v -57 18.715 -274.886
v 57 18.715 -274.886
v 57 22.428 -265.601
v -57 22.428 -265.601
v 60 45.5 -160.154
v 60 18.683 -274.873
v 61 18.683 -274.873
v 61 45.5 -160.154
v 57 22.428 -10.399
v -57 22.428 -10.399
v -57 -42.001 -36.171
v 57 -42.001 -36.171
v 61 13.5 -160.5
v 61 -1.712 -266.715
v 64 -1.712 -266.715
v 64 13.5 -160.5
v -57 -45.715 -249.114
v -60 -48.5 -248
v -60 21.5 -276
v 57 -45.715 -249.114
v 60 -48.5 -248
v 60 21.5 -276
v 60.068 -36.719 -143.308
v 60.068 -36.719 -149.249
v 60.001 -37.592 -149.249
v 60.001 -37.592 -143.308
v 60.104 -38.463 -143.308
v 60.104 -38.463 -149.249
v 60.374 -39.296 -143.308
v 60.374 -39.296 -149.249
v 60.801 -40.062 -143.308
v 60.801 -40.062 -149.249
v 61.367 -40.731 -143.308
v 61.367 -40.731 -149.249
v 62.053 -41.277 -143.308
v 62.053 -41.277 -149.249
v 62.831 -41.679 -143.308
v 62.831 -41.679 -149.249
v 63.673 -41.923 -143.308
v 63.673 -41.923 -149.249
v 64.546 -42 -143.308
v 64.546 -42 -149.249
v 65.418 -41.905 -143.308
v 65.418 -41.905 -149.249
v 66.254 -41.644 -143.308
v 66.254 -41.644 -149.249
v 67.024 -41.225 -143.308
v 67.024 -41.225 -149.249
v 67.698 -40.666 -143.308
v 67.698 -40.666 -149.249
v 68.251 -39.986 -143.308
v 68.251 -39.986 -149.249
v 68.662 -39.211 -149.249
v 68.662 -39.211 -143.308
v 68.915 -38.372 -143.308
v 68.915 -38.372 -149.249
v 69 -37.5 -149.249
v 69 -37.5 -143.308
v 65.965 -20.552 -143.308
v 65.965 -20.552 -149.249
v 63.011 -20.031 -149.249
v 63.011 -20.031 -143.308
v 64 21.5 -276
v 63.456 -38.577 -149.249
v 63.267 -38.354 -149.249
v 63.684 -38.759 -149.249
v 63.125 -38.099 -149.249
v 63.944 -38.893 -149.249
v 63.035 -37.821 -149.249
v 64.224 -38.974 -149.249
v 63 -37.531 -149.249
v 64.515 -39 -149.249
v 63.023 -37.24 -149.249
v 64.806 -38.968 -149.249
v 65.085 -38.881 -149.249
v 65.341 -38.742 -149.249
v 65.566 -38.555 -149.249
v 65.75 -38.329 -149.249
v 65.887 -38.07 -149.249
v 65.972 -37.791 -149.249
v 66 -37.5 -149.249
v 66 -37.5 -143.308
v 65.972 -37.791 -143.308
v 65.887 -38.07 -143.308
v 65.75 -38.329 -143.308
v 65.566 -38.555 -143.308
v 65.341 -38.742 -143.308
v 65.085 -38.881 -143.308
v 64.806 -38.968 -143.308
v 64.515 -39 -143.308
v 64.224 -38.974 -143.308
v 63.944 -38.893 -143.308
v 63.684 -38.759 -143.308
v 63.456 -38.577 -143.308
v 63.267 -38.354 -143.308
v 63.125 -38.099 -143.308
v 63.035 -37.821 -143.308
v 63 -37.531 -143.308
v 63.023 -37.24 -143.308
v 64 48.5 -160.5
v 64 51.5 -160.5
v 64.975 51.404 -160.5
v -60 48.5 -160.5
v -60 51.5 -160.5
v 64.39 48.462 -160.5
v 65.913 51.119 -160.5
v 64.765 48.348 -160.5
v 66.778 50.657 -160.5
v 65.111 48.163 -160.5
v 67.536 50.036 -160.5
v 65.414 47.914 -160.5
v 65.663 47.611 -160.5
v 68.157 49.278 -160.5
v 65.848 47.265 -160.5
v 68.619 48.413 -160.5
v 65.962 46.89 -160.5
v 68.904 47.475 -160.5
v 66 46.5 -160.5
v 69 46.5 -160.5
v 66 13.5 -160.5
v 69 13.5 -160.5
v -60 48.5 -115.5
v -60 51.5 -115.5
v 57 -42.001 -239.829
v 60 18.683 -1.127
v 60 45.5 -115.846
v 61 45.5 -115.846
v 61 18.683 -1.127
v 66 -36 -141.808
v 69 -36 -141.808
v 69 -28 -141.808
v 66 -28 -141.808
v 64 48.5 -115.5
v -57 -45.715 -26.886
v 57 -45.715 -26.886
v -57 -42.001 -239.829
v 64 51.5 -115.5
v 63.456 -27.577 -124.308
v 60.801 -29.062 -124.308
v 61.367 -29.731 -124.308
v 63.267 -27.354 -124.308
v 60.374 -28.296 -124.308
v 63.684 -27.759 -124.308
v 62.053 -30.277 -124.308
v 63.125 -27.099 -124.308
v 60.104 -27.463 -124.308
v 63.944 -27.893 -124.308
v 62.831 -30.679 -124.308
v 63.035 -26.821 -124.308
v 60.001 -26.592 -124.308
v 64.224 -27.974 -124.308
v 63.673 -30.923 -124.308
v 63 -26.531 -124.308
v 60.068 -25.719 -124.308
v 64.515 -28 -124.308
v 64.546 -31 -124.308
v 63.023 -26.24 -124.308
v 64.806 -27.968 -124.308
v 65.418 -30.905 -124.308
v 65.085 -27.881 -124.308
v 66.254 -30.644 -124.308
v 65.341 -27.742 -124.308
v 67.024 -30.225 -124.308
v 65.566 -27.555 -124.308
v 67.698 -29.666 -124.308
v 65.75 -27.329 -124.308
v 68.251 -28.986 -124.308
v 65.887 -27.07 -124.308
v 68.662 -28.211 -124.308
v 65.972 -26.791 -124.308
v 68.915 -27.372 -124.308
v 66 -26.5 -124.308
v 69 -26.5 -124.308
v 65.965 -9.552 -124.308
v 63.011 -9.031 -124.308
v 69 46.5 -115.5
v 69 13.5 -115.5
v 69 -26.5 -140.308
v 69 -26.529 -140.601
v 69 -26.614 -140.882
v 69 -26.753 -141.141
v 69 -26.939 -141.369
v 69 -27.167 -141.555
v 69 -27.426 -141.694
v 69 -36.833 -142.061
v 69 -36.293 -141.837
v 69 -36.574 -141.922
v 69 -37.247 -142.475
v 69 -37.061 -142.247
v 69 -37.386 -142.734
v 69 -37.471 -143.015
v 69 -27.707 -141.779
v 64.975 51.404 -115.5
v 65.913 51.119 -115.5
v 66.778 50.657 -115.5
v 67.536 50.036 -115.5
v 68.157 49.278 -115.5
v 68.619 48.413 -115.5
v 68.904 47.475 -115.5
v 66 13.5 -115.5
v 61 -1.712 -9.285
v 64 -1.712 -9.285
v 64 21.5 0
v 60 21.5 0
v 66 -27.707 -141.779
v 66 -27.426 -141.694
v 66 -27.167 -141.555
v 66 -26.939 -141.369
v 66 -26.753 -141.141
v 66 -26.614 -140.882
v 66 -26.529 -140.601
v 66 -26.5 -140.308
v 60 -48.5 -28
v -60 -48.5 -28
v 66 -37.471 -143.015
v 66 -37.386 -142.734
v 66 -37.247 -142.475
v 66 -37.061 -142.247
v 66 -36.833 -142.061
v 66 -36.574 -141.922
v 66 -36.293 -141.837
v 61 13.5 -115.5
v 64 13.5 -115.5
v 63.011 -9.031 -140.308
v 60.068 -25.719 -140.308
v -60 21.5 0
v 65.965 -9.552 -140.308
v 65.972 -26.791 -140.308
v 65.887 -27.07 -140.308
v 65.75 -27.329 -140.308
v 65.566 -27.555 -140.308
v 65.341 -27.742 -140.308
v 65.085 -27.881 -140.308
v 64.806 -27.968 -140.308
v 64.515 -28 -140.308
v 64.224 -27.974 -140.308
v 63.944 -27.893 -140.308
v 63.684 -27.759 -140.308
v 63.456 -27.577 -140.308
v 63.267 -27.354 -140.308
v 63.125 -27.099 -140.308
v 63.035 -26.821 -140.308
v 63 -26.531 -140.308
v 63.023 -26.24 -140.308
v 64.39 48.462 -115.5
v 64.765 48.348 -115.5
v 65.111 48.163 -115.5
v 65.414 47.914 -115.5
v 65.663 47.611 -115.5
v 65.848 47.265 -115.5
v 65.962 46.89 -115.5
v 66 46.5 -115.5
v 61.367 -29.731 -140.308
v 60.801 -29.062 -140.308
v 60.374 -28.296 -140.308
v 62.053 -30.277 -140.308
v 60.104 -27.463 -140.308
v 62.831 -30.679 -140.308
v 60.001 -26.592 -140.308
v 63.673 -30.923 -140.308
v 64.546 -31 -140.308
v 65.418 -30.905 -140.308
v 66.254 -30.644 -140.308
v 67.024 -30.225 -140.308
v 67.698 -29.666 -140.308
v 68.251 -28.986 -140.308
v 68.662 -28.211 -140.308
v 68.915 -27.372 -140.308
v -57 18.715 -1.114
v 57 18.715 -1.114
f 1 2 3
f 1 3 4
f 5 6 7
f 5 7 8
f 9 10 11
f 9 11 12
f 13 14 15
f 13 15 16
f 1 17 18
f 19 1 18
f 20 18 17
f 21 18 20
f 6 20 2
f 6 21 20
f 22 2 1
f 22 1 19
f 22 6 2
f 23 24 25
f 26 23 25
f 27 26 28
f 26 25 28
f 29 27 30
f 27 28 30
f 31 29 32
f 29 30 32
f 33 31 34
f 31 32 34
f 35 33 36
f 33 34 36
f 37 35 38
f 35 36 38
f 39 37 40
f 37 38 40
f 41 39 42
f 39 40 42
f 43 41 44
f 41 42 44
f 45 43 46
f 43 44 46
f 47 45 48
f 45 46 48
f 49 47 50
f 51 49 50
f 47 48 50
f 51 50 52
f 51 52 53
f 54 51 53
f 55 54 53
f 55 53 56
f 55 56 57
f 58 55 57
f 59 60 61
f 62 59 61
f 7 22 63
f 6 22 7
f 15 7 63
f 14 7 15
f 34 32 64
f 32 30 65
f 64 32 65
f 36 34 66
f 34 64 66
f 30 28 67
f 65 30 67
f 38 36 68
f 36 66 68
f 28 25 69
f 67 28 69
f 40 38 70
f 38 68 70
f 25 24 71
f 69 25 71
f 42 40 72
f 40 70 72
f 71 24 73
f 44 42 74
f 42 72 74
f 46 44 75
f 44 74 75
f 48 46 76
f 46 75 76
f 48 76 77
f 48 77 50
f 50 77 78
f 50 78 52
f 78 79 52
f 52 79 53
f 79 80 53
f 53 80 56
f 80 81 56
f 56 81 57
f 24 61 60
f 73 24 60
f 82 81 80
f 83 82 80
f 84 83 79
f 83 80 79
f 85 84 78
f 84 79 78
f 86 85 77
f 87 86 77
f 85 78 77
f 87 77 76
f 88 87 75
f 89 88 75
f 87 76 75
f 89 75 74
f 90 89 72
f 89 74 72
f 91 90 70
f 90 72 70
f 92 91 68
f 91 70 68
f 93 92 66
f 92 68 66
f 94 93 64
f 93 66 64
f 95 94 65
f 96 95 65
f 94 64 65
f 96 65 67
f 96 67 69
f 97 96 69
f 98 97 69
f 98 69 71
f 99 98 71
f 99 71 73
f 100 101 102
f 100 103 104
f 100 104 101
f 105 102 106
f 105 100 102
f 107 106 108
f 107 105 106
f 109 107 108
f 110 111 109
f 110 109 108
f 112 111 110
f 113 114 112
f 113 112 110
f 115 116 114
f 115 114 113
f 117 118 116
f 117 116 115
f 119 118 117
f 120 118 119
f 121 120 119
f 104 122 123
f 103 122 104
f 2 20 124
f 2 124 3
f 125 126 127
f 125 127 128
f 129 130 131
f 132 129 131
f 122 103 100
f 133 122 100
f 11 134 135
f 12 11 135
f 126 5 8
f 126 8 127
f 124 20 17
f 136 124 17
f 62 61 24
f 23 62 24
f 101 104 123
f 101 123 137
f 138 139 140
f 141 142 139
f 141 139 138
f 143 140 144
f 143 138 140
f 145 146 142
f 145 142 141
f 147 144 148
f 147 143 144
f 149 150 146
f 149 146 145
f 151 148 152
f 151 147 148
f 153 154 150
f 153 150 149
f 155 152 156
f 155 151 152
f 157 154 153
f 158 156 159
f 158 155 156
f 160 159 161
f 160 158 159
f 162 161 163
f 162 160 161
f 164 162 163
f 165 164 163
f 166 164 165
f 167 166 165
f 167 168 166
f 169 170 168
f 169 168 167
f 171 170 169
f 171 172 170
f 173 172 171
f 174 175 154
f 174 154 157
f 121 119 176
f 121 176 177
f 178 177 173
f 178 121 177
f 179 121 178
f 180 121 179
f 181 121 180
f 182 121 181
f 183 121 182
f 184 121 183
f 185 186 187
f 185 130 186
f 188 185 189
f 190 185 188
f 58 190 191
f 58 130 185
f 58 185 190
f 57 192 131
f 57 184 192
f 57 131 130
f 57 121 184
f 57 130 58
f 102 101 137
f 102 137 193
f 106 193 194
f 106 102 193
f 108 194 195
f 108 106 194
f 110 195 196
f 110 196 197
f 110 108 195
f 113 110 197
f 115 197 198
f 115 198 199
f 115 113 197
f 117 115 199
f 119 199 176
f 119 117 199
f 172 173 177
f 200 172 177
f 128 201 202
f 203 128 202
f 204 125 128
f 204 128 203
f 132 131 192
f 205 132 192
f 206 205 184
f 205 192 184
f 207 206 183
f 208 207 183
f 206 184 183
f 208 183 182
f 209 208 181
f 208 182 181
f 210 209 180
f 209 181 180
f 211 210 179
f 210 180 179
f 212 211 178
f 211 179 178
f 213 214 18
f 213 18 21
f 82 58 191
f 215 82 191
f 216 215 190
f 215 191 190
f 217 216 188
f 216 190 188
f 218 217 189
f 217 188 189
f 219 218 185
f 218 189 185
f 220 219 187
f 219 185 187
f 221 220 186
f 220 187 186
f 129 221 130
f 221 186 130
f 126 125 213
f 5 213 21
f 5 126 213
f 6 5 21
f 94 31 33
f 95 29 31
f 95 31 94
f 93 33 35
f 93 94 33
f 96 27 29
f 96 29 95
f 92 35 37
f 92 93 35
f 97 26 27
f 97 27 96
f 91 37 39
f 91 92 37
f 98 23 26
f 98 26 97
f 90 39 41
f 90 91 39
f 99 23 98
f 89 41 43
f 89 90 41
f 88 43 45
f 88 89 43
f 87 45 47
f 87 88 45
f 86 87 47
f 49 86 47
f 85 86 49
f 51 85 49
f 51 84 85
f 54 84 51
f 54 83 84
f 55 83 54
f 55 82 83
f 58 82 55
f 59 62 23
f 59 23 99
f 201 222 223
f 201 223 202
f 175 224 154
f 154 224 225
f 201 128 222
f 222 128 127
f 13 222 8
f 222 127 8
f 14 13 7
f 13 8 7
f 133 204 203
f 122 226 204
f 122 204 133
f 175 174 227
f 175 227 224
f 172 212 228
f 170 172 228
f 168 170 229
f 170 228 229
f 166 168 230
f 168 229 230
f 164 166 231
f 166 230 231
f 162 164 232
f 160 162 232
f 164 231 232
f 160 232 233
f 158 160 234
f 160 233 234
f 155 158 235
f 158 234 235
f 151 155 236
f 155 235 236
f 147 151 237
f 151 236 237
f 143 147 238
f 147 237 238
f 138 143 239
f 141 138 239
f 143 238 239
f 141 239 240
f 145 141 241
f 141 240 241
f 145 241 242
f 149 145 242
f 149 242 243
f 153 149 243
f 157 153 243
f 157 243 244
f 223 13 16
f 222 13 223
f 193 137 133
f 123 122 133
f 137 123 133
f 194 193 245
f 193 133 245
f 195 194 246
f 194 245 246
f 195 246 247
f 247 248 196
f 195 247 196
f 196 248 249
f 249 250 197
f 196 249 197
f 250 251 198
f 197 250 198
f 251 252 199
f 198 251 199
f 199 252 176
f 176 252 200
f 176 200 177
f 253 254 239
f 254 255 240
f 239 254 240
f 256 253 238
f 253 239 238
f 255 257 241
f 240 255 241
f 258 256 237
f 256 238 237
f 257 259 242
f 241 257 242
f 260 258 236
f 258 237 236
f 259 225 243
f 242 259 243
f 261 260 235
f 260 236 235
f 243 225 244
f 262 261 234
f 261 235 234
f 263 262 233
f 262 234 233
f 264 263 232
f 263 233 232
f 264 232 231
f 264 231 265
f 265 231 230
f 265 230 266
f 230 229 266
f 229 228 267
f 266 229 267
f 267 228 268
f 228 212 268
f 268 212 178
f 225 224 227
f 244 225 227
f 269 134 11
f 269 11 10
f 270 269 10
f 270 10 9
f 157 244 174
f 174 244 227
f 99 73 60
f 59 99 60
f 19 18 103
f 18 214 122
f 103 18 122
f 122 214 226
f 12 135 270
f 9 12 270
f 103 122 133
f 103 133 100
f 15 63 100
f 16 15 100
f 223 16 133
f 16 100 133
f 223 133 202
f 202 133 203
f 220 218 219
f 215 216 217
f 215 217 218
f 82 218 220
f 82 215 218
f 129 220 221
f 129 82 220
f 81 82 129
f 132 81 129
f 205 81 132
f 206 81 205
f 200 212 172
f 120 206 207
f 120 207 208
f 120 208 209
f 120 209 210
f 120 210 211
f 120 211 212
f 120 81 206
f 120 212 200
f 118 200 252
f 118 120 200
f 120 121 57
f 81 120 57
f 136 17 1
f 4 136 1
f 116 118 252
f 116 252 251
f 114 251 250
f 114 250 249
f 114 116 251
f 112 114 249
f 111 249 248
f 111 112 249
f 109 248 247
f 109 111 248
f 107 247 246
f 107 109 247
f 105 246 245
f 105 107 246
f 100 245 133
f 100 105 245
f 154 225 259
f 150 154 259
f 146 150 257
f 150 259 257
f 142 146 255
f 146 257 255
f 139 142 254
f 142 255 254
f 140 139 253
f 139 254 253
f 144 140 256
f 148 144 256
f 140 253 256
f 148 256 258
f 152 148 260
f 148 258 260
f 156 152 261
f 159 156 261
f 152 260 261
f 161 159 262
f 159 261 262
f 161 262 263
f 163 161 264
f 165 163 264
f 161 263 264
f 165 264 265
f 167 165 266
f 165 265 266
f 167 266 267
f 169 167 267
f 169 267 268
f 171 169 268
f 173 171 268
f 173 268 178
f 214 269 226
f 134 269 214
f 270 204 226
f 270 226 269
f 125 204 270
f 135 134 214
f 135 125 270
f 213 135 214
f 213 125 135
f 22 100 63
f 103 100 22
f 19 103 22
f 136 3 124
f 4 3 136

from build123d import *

# Parameters (mm, degrees)
SKETCH1_W           = 120
SKETCH1_H           = 97
BOSS_EXTRUDE1_DEPTH = 276
CUT_EXTRUDE3_DEPTH  = 120
CUT_EXTRUDE4_DEPTH  = 120
SKETCH7_W           = 114
SKETCH7_H           = 69.3923073
CUT_EXTRUDE5_DEPTH  = 10
SKETCH8_W           = 114
SKETCH8_H           = 69.3923073
CUT_EXTRUDE6_DEPTH  = 10
BOSS_EXTRUDE2_DEPTH = 4
CUT_EXTRUDE7_DEPTH  = 1
SKETCH11_W          = 124
SKETCH11_H          = 45
BASE_FLANGE1_DEPTH  = 3
EDGE_FLANGE1_DEPTH  = 45
CUT_EXTRUDE8_DEPTH  = 3
CUT_EXTRUDE9_DEPTH  = 3
HEM1_START          = -140.308128232
HEM1_DEPTH          = 16.000000002
HEM1_START_2        = -149.248872872
HEM1_2_DEPTH        = 5.94074464


# Read off the part's stored shape, not the designer's step: Hem1
# Sheet-metal steps are written as plain solids
with BuildPart() as part:
    # Sketch1 → Boss-Extrude1 (new body)
    with BuildSketch(Plane.XY):
        Rectangle(SKETCH1_W, SKETCH1_H)
    extrude(amount=-BOSS_EXTRUDE1_DEPTH)

    # Sketch4 → Cut-Extrude3 (cut)
    with BuildSketch(Plane(origin=(60, 0, 0), x_dir=(0, 0, -1), z_dir=(1, 0, 0))):
        Polygon((0, 48.5), (115.5, 48.5), (0, 21.5), align=None)
        Polygon((276, 48.5), (276, 21.5), (160.5, 48.5), align=None)
    extrude(amount=-CUT_EXTRUDE3_DEPTH, mode=Mode.SUBTRACT)

    # Sketch6 → Cut-Extrude4 (cut)
    with BuildSketch(Plane(origin=(60, 0, 0), x_dir=(0, 0, -1), z_dir=(1, 0, 0))):
        Polygon((0, -48.5), (0, 21.5), (28, -48.5), align=None)
        Polygon((276, -48.5), (248, -48.5), (276, 21.5), align=None)
    extrude(amount=-CUT_EXTRUDE4_DEPTH, mode=Mode.SUBTRACT)

    # Sketch7 → Cut-Extrude5 (cut)
    with BuildSketch(Plane(origin=(0, 2.965517241, -7.413793103), x_dir=(1, 0, 0), z_dir=(0, -0.37139067635410367, 0.9284766908852594))):
        with Locations((0, -17.733904796)):
            Rectangle(SKETCH7_W, SKETCH7_H)
    extrude(amount=-CUT_EXTRUDE5_DEPTH, mode=Mode.SUBTRACT)

    # Sketch8 → Cut-Extrude6 (cut)
    with BuildSketch(Plane(origin=(0, -92.206896552, -230.517241379), x_dir=(-1, 0, 0), z_dir=(0, -0.37139067635410367, -0.9284766908852594))):
        with Locations((0, 84.769921878)):
            Rectangle(SKETCH8_W, SKETCH8_H)
    extrude(amount=-CUT_EXTRUDE6_DEPTH, mode=Mode.SUBTRACT)

    # Sketch9 → Boss-Extrude2 (add)
    with BuildSketch(Plane(origin=(60, 0, 0), x_dir=(0, 0, -1), z_dir=(1, 0, 0))):
        Polygon((0, 21.5), (115.5, 48.5), (160.5, 48.5), (276, 21.5), (266.715233091, -1.711917272), (160.5, 13.5), (115.5, 13.5), (9.284766909, -1.711917272), align=None)
    extrude(amount=BOSS_EXTRUDE2_DEPTH)

    # Sketch10 → Cut-Extrude7 (cut)
    with BuildSketch(Plane(origin=(60, 0, 0), x_dir=(0, 0, -1), z_dir=(1, 0, 0))):
        Polygon((0.682888101, 18.578756456), (9.284766909, -1.711917272), (115.5, 13.5), (160.5, 13.5), (266.715233091, -1.711917272), (275.317111899, 18.578756456), (160.154014518, 45.5), (115.845985482, 45.5), align=None)
    extrude(amount=CUT_EXTRUDE7_DEPTH, mode=Mode.SUBTRACT)


with BuildPart() as body_2:
    # Sketch11 → Base-Flange1 (new body)
    with BuildSketch(Plane(origin=(0, 48.5, 0), x_dir=(1, 0, 0), z_dir=(0, 1, 0))):
        with Locations((2, 138)):
            Rectangle(SKETCH11_W, SKETCH11_H)
    extrude(amount=BASE_FLANGE1_DEPTH)

    # Edge-Flange1 section (across the edge) → Edge-Flange1 (add)
    with BuildSketch(Plane(origin=(66, 48.5, -160.5), x_dir=(-1, 0, 0), z_dir=(0, 0, 1))):
        with BuildLine():
            Line((-3, 2), (-3, 97))
            Line((-3, 97), (0, 97))
            Line((0, 97), (0, 2))
            ThreePointArc((0, 2), (0.585786438, 0.585786438), (2, 0))
            Line((2, 0), (2, -3))
            ThreePointArc((2, -3), (-1.535533906, -1.535533906), (-3, 2))
        make_face()
    extrude(amount=EDGE_FLANGE1_DEPTH)

    # Sketch19 → Cut-Extrude8 (cut)
    with BuildSketch(Plane(origin=(69, 0, 0), x_dir=(0, 0, -1), z_dir=(1, 0, 0))):
        Polygon((123.398199297, -48.5), (115.5, 13.5), (115.5, -48.5), align=None)
        Polygon((151.398199297, -48.5), (160.5, -48.5), (160.5, 13.5), align=None)
    extrude(amount=-CUT_EXTRUDE8_DEPTH, mode=Mode.SUBTRACT)

    # Sketch20 → Cut-Extrude9 (cut)
    with BuildSketch(Plane(origin=(69, 0, 0), x_dir=(0, 0, -1), z_dir=(1, 0, 0))):
        with BuildLine():
            Line((124.30812823, -26.5), (115.5, 13.5))
            Line((115.5, 13.5), (123.398199297, -48.5))
            Line((123.398199297, -48.5), (151.398199297, -48.5))
            Line((151.398199297, -48.5), (160.5, 13.5))
            Line((160.5, 13.5), (149.248872872, -37.5))
            Line((149.248872872, -37.5), (143.308128232, -37.5))
            ThreePointArc((143.308128232, -37.5), (142.24746806, -37.060660172), (141.808128232, -36))
            Line((141.808128232, -36), (141.808128232, -28))
            ThreePointArc((141.808128232, -28), (141.368788404, -26.939339828), (140.308128232, -26.5))
            Line((140.308128232, -26.5), (124.30812823, -26.5))
        make_face()
    extrude(amount=-CUT_EXTRUDE9_DEPTH, mode=Mode.SUBTRACT)

    # Hem1 outline → Hem1 (add)
    with BuildSketch(Plane.XY.offset(HEM1_START)):
        with BuildLine():
            Line((65.965270364, -9.551883096), (63.010847105, -9.030938563))
            Line((63.010847105, -9.030938563), (60.068365111, -25.7185832))
            ThreePointArc((60.068365111, -25.7185832), (64.107799157, -30.982876141), (69, -26.5))
            Line((69, -26.5), (66, -26.5))
            ThreePointArc((66, -26.5), (64.369266385, -27.994292047), (63.02278837, -26.239527733))
            Line((63.02278837, -26.239527733), (65.965270364, -9.551883096))
        make_face()
    extrude(amount=HEM1_DEPTH)

    # Hem1 2 outline → Hem1 2 (add)
    with BuildSketch(Plane.XY.offset(HEM1_START_2)):
        with BuildLine():
            Line((65.965270364, -20.551883096), (63.010847105, -20.030938563))
            Line((63.010847105, -20.030938563), (60.068365111, -36.7185832))
            ThreePointArc((60.068365111, -36.7185832), (64.107799157, -41.982876141), (69, -37.5))
            Line((69, -37.5), (66, -37.5))
            ThreePointArc((66, -37.5), (64.369266385, -38.994292047), (63.02278837, -37.239527733))
            Line((63.02278837, -37.239527733), (65.965270364, -20.551883096))
        make_face()
    extrude(amount=HEM1_2_DEPTH)


solid = Compound([part.part, body_2.part])
